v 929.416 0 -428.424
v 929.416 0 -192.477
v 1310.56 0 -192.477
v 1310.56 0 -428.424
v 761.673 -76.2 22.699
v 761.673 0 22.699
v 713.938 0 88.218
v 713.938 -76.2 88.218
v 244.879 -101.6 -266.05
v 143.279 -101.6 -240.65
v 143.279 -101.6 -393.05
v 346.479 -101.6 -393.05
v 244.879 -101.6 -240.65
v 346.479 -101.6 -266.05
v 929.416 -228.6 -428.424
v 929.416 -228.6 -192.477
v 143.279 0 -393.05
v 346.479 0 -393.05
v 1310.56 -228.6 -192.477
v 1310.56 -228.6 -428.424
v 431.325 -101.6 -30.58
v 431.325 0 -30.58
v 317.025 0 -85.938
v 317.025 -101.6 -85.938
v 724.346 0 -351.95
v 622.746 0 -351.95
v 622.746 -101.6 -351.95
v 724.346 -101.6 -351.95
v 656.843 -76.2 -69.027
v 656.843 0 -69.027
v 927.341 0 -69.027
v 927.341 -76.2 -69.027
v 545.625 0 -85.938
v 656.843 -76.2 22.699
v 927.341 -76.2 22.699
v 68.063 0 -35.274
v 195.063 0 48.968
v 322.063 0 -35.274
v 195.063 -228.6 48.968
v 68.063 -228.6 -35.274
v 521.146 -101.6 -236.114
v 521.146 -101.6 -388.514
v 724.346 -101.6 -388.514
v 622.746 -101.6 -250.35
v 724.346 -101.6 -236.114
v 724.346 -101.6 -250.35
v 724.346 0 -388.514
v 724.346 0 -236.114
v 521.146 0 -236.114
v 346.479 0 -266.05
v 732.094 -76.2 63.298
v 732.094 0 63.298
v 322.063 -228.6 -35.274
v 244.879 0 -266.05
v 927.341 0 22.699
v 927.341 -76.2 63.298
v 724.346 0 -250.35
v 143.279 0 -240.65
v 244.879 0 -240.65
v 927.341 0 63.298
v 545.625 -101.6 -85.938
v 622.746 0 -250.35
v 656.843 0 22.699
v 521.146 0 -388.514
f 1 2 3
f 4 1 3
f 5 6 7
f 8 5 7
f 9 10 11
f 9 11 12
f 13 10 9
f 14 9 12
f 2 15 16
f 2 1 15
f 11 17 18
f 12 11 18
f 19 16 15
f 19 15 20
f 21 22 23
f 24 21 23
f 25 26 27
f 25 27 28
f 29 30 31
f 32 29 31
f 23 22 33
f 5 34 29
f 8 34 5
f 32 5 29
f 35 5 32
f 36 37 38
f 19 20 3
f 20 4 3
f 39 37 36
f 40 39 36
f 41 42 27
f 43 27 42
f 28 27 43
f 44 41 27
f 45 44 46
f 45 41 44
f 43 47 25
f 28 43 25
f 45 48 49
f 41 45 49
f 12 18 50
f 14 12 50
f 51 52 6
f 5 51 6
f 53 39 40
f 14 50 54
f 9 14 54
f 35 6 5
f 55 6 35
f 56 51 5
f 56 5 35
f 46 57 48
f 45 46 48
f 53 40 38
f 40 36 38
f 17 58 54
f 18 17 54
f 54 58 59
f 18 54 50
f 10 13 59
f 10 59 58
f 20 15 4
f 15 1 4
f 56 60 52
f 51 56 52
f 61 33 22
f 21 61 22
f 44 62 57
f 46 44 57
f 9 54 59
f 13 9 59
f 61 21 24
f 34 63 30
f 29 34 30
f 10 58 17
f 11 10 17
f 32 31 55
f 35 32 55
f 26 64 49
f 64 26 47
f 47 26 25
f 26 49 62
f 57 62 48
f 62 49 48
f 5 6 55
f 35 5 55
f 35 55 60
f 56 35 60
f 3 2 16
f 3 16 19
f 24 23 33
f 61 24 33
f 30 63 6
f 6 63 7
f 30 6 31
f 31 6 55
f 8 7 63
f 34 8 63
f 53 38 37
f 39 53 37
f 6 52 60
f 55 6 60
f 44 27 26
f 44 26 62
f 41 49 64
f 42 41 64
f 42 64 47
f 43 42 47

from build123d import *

# Parameters (mm, degrees)
F1_DEPTH  = 127
F4_DEPTH  = 76.2
F6_DEPTH  = 25.4
F8_DEPTH  = 101.6
F9_W      = 165.6684279442
F9_H      = 91.7260497808
F11_DEPTH = 76.2
F13_DEPTH = 101.6
F14_W     = 101.6
F14_H     = 101.6
F15_DEPTH = 101.6
F16_W     = 101.6
F16_H     = 101.6
F17_DEPTH = 127
F18_W     = 381.1446428299
F18_H     = 235.9467148781
F20_DEPTH = 127
F21_W     = 381.1446428299
F21_H     = 235.9467148781
F19_W     = 381.1446428299
F19_H     = 235.9467148781
F23_DEPTH = 101.6


with BuildPart() as f1:
    # F0 (on Front) → F1 (new body)
    with BuildSketch(Plane.XZ):
        Polygon((195.0628506741, 48.968303573), (68.0628506741, -35.273966102), (322.0628506741, -35.273966102), align=None)
    extrude(amount=F1_DEPTH)

    # F2 (on face) → F4 (join)
    with BuildSketch(Plane.XZ.offset(127)):
        Polygon((68.0628506741, -35.273966102), (322.0628506741, -35.273966102), (195.0628506741, 48.968303573), align=None)
    extrude(amount=F4_DEPTH)

    # F5 (on face) → F6 (join)
    with BuildSketch(Plane.XZ.offset(203.2)):
        Polygon((195.0628506741, 48.968303573), (68.0628506741, -35.273966102), (322.0628506741, -35.273966102), align=None)
    extrude(amount=F6_DEPTH)


with BuildPart() as f8:
    # F7 (on Front) → F8 (new body)
    with BuildSketch(Plane.XZ):
        Polygon((545.6249140978, -85.9377876582), (431.3249140978, -30.5797710753), (317.0249140978, -85.9377876582), align=None)
    extrude(amount=F8_DEPTH)


with BuildPart() as f11:
    # F9 (on Front) → F11 (new body)
    with BuildSketch(Plane.XZ):
        with Locations((844.5067703724, -23.1638774276)):
            Rectangle(F9_W, F9_H)
        Polygon((713.9375209808, 88.2177501917), (656.8427681923, 22.6991474628), (656.8427681923, -69.026902318), (761.6725564003, -69.026902318), (761.6725564003, 22.6991474628), (732.0935192904, 63.2977804056), align=None)
    extrude(amount=F11_DEPTH)


with BuildPart() as f11b:
    # F10 (on face) → F11, piece 2 (new body)
    with BuildSketch(Plane.XZ):
        Polygon((927.3409843445, 22.6991474628), (927.3409843445, 63.2977804056), (732.0935192904, 63.2977804056), (761.6725564003, 22.6991474628), align=None)
    extrude(amount=F11_DEPTH)


with BuildPart() as f13:
    # F12 (on Front) → F13 (new body)
    with BuildSketch(Plane.XZ):
        Polygon((244.8786242905, -240.6501034379), (143.2786242905, -240.6501034379), (143.2786242905, -393.0501034379), (346.4786242905, -393.0501034379), (346.4786242905, -266.0501034379), (244.8786242905, -266.0501034379), align=None)
    extrude(amount=F13_DEPTH)


with BuildPart() as f15:
    # F14 (on Front) → F15 (new body)
    with BuildSketch(Plane.XZ):
        Polygon((724.3456629276, -236.1136930588), (521.1456629276, -236.1136930588), (521.1456629276, -388.5136930588), (724.3456629276, -388.5136930588), (724.3456629276, -360.9611363416), (622.7456629276, -360.9611363416), (622.7456629276, -259.3611363416), (724.3456629276, -259.3611363416), align=None)
        with Locations((673.5456629276, -310.1611363416)):
            Rectangle(F14_W, F14_H)
    extrude(amount=F15_DEPTH)

    # F16 (on face) → F17 (cut)
    with BuildSketch(Plane.XZ.offset(101.6)):
        with Locations((673.5456629276, -301.1498109818)):
            Rectangle(F16_W, F16_H)
    extrude(amount=-F17_DEPTH, mode=Mode.SUBTRACT)


with BuildPart() as f20:
    # F18 (on Front) → F20 (new body)
    with BuildSketch(Plane.XZ):
        with Locations((1119.9880242348, -310.4507923126)):
            Rectangle(F18_W, F18_H)
    extrude(amount=F20_DEPTH)

    # F21 (on face) + F19 (on face) → F23 (join)
    with BuildSketch(Plane.XZ.offset(127)):
        with Locations((1119.9880242348, -310.4507923126)):
            Rectangle(F21_W, F21_H)
    with BuildSketch(Plane.XZ):
        with Locations((1119.9880242348, -310.4507923126)):
            Rectangle(F19_W, F19_H)
    extrude(amount=F23_DEPTH)


solid = Compound([f1.part, f8.part, f11.part, f11b.part, f13.part, f15.part, f20.part])
